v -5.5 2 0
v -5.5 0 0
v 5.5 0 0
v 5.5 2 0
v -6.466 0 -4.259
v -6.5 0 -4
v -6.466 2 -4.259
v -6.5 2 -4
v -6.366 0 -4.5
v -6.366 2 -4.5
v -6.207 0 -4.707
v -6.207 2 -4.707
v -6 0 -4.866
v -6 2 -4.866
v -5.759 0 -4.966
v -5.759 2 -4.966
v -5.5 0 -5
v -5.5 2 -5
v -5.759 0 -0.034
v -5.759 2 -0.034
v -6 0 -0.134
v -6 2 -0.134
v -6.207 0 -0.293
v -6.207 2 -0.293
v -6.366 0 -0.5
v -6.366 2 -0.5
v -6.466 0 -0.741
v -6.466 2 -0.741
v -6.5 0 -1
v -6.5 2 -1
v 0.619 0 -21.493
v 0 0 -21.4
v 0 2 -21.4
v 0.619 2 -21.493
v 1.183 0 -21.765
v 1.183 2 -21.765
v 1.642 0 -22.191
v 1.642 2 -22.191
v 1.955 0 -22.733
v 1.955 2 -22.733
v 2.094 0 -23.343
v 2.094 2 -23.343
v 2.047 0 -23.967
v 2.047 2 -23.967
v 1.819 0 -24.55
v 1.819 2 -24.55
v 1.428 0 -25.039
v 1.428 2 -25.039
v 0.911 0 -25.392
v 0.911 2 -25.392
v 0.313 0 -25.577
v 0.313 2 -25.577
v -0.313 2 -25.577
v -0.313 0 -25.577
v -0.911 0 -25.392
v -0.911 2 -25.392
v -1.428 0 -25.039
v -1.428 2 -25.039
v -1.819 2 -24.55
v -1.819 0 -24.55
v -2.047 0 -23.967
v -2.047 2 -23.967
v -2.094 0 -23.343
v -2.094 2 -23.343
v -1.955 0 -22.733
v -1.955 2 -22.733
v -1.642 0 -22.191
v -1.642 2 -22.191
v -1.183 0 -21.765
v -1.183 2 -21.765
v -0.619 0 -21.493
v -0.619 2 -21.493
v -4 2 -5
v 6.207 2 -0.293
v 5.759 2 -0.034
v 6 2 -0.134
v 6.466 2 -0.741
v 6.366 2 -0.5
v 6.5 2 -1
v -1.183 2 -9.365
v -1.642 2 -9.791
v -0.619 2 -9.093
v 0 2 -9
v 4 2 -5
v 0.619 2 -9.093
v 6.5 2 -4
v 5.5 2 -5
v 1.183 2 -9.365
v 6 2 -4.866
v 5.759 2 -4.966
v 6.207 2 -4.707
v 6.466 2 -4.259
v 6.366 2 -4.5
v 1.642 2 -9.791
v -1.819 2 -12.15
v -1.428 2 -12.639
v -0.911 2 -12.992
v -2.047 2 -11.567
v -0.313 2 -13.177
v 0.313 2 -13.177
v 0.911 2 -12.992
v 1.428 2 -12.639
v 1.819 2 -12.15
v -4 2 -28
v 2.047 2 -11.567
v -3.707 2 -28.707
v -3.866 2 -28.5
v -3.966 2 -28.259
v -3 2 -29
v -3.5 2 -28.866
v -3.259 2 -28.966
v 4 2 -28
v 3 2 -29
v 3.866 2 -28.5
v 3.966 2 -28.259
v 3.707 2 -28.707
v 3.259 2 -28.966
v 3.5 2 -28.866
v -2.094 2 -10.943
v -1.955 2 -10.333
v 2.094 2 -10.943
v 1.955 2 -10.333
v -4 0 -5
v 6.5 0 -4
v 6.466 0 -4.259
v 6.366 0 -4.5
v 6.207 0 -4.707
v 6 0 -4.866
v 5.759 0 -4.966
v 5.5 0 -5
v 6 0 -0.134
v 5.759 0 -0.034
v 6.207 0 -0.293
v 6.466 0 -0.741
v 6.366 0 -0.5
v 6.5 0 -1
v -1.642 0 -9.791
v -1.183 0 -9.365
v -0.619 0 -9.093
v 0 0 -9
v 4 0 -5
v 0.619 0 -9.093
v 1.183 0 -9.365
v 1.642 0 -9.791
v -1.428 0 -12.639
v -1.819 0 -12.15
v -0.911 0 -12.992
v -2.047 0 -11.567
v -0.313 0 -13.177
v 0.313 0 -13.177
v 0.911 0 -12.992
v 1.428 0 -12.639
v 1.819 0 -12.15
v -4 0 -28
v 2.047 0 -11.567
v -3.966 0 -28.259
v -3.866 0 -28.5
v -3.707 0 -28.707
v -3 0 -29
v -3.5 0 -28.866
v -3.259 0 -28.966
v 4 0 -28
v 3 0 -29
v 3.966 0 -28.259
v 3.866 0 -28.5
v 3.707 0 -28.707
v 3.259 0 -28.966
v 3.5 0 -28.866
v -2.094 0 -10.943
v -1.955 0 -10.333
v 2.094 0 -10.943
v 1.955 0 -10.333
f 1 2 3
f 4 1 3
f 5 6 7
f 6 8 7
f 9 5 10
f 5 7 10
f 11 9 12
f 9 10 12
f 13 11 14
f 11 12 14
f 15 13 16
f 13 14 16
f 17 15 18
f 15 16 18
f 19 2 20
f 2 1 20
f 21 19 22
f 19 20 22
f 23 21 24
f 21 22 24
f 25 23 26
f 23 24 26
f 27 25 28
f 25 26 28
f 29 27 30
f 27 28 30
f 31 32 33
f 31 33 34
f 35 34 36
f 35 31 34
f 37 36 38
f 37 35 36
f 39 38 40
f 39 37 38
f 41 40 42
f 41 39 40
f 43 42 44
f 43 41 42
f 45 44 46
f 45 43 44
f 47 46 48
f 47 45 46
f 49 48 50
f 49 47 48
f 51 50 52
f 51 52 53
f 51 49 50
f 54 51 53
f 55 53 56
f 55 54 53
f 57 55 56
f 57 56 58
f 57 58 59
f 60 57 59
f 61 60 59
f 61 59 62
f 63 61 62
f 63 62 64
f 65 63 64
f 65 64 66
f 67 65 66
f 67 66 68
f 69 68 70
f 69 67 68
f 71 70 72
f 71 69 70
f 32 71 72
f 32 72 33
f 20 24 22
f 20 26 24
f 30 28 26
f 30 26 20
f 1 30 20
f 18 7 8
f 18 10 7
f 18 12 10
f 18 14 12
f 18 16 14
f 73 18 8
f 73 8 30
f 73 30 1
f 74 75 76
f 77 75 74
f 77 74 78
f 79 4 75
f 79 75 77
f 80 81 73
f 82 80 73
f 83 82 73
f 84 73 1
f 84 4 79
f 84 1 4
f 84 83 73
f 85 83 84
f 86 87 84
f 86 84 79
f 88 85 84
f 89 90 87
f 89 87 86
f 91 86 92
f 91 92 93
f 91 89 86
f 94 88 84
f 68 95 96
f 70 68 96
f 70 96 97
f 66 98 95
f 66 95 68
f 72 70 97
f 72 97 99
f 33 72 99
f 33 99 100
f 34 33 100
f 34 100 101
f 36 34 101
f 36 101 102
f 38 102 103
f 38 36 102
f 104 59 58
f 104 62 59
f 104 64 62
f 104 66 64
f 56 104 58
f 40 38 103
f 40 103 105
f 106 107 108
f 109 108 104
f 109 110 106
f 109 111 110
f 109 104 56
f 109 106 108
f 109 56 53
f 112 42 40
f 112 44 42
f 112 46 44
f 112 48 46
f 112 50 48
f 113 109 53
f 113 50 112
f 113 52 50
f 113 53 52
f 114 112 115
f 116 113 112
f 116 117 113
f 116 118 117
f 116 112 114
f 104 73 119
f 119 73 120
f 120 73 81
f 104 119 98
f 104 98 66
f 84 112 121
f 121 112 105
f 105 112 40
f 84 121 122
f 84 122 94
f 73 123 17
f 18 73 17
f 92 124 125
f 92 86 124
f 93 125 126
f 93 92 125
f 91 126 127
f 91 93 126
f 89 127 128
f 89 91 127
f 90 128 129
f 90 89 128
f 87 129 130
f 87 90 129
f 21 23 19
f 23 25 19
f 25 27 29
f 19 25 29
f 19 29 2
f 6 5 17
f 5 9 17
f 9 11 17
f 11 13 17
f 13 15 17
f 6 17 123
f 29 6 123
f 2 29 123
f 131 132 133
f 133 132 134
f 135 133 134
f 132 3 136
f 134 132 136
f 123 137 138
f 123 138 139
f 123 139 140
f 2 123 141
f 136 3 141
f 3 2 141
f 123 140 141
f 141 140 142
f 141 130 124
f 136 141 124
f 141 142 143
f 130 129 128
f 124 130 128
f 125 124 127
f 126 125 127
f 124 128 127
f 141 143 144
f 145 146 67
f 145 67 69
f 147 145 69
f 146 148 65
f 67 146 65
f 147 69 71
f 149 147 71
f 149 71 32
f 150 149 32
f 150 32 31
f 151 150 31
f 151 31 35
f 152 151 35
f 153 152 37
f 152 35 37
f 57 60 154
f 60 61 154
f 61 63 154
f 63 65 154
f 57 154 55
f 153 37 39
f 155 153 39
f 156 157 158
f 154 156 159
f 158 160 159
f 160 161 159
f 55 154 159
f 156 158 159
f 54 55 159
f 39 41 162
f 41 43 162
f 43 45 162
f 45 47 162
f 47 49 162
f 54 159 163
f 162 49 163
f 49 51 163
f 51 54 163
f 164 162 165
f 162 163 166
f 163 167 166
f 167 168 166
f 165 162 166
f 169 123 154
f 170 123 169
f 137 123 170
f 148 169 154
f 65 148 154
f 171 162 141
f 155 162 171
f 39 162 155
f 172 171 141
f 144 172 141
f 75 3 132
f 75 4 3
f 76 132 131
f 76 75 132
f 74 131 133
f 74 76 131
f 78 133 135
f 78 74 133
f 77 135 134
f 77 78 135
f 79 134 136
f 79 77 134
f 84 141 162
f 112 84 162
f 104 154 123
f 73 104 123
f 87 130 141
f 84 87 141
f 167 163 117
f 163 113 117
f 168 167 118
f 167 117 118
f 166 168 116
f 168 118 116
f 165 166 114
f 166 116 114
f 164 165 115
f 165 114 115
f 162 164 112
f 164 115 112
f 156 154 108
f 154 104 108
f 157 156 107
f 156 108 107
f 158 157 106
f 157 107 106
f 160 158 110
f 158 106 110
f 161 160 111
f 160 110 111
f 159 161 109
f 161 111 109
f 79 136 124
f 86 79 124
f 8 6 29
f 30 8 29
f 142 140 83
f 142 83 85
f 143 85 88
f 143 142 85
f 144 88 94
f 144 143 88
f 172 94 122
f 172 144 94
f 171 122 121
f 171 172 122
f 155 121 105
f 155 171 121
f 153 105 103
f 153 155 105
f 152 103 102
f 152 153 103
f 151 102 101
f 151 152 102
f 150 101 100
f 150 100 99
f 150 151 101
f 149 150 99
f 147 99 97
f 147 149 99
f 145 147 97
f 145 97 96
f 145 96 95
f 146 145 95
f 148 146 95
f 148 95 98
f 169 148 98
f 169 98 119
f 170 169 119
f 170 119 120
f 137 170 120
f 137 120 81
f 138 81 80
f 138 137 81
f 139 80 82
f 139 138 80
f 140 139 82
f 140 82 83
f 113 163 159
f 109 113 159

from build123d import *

# Parameters (mm, degrees)
SKETCH1_R           = 2.1
BOSS_EXTRUDE1_DEPTH = 2
FILLET1_R           = 1
FILLET2_R           = 1
FILLET3_R           = 1
FILLET4_R           = 1
FILLET5_R           = 1
FILLET6_R           = 1


with BuildPart() as part:
    # Sketch1 → Boss-Extrude1 (new body)
    with BuildSketch(Plane(origin=(0, 0, 0), x_dir=(1, 0, 0), z_dir=(0, 1, 0))):
        Polygon((-6.5, 0), (6.5, 0), (6.5, 5), (4, 5), (4, 29), (-4, 29), (-4, 5), (-6.5, 5), align=None)
        with Locations(Location((0, 11.1, 0), (0, 0, 270))):
            Circle(SKETCH1_R, mode=Mode.SUBTRACT)
        with Locations(Location((0, 23.5, 0), (0, 0, 270))):
            Circle(SKETCH1_R, mode=Mode.SUBTRACT)
    extrude(amount=BOSS_EXTRUDE1_DEPTH)

    # Fillet1
    fillet1_edges = [part.edges().sort_by_distance(p)[0] for p in [
        (6.5, 1, 0),
    ]]
    fillet(fillet1_edges, radius=FILLET1_R)

    # Fillet2
    fillet2_edges = [part.edges().sort_by_distance(p)[0] for p in [
        (6.5, 1, -5),
    ]]
    fillet(fillet2_edges, radius=FILLET2_R)

    # Fillet3
    fillet3_edges = [part.edges().sort_by_distance(p)[0] for p in [
        (-6.5, 1, 0),
    ]]
    fillet(fillet3_edges, radius=FILLET3_R)

    # Fillet4
    fillet4_edges = [part.edges().sort_by_distance(p)[0] for p in [
        (-6.5, 1, -5),
    ]]
    fillet(fillet4_edges, radius=FILLET4_R)

    # Fillet5
    fillet5_edges = [part.edges().sort_by_distance(p)[0] for p in [
        (-4, 1, -29),
    ]]
    fillet(fillet5_edges, radius=FILLET5_R)

    # Fillet6
    fillet6_edges = [part.edges().sort_by_distance(p)[0] for p in [
        (4, 1, -29),
    ]]
    fillet(fillet6_edges, radius=FILLET6_R)


solid = part.part
